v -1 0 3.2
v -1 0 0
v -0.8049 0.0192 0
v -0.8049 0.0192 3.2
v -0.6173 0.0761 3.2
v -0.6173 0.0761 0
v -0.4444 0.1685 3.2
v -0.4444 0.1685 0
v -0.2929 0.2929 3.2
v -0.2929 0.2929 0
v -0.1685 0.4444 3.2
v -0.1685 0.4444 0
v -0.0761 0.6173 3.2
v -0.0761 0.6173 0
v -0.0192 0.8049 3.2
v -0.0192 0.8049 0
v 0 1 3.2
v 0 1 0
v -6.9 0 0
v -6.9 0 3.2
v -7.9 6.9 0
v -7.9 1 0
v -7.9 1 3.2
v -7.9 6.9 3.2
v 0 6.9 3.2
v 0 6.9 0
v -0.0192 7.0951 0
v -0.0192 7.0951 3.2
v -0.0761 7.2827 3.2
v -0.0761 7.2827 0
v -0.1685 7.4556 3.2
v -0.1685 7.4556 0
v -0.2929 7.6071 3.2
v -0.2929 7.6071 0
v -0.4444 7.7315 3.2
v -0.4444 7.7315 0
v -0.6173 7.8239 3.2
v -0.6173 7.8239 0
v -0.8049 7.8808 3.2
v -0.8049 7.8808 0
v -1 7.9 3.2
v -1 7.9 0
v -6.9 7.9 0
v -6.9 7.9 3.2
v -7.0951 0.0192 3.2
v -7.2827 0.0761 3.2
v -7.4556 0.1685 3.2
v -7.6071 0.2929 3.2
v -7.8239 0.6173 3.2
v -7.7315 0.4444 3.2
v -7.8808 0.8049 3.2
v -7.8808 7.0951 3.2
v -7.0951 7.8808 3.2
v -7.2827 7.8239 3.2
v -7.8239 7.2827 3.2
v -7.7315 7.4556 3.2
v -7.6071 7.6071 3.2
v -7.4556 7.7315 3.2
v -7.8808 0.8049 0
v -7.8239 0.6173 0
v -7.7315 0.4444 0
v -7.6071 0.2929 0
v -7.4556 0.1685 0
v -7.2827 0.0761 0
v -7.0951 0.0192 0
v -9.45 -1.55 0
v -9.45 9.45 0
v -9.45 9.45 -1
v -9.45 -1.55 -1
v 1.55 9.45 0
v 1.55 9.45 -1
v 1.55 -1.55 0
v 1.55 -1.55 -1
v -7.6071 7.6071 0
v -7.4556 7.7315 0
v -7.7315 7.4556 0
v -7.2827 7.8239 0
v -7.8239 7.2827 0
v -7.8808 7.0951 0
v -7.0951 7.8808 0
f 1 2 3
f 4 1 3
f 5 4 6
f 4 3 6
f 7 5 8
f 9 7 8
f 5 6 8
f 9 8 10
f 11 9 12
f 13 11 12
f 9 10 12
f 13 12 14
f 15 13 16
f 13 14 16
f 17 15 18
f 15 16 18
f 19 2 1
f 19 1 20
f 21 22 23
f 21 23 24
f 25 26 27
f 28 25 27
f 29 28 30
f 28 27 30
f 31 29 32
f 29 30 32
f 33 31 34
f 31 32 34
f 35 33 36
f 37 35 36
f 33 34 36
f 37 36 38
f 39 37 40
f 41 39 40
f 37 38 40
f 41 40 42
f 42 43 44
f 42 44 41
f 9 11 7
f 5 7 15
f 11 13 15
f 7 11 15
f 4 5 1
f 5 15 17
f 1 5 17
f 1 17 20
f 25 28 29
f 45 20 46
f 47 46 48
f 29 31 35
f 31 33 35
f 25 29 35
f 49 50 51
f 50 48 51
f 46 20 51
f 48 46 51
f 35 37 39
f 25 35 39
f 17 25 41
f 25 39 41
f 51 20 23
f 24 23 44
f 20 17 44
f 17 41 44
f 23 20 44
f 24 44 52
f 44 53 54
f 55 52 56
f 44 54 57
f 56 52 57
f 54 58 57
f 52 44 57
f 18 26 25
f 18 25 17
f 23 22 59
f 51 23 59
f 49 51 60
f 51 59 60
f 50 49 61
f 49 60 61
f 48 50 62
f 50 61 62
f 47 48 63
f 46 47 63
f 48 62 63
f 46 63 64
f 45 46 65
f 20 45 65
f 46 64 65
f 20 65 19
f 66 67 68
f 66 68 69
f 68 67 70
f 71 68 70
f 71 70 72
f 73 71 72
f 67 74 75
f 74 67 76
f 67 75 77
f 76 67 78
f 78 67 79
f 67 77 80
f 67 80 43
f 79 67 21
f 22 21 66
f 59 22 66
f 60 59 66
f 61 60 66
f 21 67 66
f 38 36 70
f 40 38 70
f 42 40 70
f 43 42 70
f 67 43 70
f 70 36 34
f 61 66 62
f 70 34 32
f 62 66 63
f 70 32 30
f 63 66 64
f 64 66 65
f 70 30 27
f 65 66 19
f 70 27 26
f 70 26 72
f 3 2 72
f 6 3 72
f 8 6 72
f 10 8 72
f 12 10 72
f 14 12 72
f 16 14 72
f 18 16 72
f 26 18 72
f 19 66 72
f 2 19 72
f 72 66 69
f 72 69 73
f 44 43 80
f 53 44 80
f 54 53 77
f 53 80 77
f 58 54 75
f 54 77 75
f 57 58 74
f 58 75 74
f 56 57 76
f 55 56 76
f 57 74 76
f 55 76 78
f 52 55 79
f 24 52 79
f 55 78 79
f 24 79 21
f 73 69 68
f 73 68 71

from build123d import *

# Parameters (mm, degrees)
PAD_DEPTH    = 3.2
SKETCH001_W  = 11
SKETCH001_H  = 11
PAD001_DEPTH = 1


with BuildPart() as part:
    # Sketch → Pad (new body)
    with BuildSketch(Plane.XY):
        with BuildLine():
            Line((-1, 0), (-6.9, 0))
            ThreePointArc((-7.9, 1), (-7.607107, 0.292893), (-6.9, 0))
            Line((-7.9, 1), (-7.9, 6.9))
            ThreePointArc((-6.9, 7.9), (-7.607107, 7.607107), (-7.9, 6.9))
            Line((-6.9, 7.9), (-1, 7.9))
            ThreePointArc((0, 6.9), (-0.292893, 7.607107), (-1, 7.9))
            Line((0, 6.9), (0, 1))
            ThreePointArc((-1, 0), (-0.292893, 0.292893), (0, 1))
        make_face()
    extrude(amount=PAD_DEPTH)

    # Sketch001 (on DatumPlane) → Pad001 (join)
    with BuildSketch(Plane(origin=(0, 0, 0), x_dir=(1, 0, 0), z_dir=(0, 0, -1))):
        with Locations((-3.95, -3.95)):
            Rectangle(SKETCH001_W, SKETCH001_H)
    extrude(amount=PAD001_DEPTH)


solid = part.part
